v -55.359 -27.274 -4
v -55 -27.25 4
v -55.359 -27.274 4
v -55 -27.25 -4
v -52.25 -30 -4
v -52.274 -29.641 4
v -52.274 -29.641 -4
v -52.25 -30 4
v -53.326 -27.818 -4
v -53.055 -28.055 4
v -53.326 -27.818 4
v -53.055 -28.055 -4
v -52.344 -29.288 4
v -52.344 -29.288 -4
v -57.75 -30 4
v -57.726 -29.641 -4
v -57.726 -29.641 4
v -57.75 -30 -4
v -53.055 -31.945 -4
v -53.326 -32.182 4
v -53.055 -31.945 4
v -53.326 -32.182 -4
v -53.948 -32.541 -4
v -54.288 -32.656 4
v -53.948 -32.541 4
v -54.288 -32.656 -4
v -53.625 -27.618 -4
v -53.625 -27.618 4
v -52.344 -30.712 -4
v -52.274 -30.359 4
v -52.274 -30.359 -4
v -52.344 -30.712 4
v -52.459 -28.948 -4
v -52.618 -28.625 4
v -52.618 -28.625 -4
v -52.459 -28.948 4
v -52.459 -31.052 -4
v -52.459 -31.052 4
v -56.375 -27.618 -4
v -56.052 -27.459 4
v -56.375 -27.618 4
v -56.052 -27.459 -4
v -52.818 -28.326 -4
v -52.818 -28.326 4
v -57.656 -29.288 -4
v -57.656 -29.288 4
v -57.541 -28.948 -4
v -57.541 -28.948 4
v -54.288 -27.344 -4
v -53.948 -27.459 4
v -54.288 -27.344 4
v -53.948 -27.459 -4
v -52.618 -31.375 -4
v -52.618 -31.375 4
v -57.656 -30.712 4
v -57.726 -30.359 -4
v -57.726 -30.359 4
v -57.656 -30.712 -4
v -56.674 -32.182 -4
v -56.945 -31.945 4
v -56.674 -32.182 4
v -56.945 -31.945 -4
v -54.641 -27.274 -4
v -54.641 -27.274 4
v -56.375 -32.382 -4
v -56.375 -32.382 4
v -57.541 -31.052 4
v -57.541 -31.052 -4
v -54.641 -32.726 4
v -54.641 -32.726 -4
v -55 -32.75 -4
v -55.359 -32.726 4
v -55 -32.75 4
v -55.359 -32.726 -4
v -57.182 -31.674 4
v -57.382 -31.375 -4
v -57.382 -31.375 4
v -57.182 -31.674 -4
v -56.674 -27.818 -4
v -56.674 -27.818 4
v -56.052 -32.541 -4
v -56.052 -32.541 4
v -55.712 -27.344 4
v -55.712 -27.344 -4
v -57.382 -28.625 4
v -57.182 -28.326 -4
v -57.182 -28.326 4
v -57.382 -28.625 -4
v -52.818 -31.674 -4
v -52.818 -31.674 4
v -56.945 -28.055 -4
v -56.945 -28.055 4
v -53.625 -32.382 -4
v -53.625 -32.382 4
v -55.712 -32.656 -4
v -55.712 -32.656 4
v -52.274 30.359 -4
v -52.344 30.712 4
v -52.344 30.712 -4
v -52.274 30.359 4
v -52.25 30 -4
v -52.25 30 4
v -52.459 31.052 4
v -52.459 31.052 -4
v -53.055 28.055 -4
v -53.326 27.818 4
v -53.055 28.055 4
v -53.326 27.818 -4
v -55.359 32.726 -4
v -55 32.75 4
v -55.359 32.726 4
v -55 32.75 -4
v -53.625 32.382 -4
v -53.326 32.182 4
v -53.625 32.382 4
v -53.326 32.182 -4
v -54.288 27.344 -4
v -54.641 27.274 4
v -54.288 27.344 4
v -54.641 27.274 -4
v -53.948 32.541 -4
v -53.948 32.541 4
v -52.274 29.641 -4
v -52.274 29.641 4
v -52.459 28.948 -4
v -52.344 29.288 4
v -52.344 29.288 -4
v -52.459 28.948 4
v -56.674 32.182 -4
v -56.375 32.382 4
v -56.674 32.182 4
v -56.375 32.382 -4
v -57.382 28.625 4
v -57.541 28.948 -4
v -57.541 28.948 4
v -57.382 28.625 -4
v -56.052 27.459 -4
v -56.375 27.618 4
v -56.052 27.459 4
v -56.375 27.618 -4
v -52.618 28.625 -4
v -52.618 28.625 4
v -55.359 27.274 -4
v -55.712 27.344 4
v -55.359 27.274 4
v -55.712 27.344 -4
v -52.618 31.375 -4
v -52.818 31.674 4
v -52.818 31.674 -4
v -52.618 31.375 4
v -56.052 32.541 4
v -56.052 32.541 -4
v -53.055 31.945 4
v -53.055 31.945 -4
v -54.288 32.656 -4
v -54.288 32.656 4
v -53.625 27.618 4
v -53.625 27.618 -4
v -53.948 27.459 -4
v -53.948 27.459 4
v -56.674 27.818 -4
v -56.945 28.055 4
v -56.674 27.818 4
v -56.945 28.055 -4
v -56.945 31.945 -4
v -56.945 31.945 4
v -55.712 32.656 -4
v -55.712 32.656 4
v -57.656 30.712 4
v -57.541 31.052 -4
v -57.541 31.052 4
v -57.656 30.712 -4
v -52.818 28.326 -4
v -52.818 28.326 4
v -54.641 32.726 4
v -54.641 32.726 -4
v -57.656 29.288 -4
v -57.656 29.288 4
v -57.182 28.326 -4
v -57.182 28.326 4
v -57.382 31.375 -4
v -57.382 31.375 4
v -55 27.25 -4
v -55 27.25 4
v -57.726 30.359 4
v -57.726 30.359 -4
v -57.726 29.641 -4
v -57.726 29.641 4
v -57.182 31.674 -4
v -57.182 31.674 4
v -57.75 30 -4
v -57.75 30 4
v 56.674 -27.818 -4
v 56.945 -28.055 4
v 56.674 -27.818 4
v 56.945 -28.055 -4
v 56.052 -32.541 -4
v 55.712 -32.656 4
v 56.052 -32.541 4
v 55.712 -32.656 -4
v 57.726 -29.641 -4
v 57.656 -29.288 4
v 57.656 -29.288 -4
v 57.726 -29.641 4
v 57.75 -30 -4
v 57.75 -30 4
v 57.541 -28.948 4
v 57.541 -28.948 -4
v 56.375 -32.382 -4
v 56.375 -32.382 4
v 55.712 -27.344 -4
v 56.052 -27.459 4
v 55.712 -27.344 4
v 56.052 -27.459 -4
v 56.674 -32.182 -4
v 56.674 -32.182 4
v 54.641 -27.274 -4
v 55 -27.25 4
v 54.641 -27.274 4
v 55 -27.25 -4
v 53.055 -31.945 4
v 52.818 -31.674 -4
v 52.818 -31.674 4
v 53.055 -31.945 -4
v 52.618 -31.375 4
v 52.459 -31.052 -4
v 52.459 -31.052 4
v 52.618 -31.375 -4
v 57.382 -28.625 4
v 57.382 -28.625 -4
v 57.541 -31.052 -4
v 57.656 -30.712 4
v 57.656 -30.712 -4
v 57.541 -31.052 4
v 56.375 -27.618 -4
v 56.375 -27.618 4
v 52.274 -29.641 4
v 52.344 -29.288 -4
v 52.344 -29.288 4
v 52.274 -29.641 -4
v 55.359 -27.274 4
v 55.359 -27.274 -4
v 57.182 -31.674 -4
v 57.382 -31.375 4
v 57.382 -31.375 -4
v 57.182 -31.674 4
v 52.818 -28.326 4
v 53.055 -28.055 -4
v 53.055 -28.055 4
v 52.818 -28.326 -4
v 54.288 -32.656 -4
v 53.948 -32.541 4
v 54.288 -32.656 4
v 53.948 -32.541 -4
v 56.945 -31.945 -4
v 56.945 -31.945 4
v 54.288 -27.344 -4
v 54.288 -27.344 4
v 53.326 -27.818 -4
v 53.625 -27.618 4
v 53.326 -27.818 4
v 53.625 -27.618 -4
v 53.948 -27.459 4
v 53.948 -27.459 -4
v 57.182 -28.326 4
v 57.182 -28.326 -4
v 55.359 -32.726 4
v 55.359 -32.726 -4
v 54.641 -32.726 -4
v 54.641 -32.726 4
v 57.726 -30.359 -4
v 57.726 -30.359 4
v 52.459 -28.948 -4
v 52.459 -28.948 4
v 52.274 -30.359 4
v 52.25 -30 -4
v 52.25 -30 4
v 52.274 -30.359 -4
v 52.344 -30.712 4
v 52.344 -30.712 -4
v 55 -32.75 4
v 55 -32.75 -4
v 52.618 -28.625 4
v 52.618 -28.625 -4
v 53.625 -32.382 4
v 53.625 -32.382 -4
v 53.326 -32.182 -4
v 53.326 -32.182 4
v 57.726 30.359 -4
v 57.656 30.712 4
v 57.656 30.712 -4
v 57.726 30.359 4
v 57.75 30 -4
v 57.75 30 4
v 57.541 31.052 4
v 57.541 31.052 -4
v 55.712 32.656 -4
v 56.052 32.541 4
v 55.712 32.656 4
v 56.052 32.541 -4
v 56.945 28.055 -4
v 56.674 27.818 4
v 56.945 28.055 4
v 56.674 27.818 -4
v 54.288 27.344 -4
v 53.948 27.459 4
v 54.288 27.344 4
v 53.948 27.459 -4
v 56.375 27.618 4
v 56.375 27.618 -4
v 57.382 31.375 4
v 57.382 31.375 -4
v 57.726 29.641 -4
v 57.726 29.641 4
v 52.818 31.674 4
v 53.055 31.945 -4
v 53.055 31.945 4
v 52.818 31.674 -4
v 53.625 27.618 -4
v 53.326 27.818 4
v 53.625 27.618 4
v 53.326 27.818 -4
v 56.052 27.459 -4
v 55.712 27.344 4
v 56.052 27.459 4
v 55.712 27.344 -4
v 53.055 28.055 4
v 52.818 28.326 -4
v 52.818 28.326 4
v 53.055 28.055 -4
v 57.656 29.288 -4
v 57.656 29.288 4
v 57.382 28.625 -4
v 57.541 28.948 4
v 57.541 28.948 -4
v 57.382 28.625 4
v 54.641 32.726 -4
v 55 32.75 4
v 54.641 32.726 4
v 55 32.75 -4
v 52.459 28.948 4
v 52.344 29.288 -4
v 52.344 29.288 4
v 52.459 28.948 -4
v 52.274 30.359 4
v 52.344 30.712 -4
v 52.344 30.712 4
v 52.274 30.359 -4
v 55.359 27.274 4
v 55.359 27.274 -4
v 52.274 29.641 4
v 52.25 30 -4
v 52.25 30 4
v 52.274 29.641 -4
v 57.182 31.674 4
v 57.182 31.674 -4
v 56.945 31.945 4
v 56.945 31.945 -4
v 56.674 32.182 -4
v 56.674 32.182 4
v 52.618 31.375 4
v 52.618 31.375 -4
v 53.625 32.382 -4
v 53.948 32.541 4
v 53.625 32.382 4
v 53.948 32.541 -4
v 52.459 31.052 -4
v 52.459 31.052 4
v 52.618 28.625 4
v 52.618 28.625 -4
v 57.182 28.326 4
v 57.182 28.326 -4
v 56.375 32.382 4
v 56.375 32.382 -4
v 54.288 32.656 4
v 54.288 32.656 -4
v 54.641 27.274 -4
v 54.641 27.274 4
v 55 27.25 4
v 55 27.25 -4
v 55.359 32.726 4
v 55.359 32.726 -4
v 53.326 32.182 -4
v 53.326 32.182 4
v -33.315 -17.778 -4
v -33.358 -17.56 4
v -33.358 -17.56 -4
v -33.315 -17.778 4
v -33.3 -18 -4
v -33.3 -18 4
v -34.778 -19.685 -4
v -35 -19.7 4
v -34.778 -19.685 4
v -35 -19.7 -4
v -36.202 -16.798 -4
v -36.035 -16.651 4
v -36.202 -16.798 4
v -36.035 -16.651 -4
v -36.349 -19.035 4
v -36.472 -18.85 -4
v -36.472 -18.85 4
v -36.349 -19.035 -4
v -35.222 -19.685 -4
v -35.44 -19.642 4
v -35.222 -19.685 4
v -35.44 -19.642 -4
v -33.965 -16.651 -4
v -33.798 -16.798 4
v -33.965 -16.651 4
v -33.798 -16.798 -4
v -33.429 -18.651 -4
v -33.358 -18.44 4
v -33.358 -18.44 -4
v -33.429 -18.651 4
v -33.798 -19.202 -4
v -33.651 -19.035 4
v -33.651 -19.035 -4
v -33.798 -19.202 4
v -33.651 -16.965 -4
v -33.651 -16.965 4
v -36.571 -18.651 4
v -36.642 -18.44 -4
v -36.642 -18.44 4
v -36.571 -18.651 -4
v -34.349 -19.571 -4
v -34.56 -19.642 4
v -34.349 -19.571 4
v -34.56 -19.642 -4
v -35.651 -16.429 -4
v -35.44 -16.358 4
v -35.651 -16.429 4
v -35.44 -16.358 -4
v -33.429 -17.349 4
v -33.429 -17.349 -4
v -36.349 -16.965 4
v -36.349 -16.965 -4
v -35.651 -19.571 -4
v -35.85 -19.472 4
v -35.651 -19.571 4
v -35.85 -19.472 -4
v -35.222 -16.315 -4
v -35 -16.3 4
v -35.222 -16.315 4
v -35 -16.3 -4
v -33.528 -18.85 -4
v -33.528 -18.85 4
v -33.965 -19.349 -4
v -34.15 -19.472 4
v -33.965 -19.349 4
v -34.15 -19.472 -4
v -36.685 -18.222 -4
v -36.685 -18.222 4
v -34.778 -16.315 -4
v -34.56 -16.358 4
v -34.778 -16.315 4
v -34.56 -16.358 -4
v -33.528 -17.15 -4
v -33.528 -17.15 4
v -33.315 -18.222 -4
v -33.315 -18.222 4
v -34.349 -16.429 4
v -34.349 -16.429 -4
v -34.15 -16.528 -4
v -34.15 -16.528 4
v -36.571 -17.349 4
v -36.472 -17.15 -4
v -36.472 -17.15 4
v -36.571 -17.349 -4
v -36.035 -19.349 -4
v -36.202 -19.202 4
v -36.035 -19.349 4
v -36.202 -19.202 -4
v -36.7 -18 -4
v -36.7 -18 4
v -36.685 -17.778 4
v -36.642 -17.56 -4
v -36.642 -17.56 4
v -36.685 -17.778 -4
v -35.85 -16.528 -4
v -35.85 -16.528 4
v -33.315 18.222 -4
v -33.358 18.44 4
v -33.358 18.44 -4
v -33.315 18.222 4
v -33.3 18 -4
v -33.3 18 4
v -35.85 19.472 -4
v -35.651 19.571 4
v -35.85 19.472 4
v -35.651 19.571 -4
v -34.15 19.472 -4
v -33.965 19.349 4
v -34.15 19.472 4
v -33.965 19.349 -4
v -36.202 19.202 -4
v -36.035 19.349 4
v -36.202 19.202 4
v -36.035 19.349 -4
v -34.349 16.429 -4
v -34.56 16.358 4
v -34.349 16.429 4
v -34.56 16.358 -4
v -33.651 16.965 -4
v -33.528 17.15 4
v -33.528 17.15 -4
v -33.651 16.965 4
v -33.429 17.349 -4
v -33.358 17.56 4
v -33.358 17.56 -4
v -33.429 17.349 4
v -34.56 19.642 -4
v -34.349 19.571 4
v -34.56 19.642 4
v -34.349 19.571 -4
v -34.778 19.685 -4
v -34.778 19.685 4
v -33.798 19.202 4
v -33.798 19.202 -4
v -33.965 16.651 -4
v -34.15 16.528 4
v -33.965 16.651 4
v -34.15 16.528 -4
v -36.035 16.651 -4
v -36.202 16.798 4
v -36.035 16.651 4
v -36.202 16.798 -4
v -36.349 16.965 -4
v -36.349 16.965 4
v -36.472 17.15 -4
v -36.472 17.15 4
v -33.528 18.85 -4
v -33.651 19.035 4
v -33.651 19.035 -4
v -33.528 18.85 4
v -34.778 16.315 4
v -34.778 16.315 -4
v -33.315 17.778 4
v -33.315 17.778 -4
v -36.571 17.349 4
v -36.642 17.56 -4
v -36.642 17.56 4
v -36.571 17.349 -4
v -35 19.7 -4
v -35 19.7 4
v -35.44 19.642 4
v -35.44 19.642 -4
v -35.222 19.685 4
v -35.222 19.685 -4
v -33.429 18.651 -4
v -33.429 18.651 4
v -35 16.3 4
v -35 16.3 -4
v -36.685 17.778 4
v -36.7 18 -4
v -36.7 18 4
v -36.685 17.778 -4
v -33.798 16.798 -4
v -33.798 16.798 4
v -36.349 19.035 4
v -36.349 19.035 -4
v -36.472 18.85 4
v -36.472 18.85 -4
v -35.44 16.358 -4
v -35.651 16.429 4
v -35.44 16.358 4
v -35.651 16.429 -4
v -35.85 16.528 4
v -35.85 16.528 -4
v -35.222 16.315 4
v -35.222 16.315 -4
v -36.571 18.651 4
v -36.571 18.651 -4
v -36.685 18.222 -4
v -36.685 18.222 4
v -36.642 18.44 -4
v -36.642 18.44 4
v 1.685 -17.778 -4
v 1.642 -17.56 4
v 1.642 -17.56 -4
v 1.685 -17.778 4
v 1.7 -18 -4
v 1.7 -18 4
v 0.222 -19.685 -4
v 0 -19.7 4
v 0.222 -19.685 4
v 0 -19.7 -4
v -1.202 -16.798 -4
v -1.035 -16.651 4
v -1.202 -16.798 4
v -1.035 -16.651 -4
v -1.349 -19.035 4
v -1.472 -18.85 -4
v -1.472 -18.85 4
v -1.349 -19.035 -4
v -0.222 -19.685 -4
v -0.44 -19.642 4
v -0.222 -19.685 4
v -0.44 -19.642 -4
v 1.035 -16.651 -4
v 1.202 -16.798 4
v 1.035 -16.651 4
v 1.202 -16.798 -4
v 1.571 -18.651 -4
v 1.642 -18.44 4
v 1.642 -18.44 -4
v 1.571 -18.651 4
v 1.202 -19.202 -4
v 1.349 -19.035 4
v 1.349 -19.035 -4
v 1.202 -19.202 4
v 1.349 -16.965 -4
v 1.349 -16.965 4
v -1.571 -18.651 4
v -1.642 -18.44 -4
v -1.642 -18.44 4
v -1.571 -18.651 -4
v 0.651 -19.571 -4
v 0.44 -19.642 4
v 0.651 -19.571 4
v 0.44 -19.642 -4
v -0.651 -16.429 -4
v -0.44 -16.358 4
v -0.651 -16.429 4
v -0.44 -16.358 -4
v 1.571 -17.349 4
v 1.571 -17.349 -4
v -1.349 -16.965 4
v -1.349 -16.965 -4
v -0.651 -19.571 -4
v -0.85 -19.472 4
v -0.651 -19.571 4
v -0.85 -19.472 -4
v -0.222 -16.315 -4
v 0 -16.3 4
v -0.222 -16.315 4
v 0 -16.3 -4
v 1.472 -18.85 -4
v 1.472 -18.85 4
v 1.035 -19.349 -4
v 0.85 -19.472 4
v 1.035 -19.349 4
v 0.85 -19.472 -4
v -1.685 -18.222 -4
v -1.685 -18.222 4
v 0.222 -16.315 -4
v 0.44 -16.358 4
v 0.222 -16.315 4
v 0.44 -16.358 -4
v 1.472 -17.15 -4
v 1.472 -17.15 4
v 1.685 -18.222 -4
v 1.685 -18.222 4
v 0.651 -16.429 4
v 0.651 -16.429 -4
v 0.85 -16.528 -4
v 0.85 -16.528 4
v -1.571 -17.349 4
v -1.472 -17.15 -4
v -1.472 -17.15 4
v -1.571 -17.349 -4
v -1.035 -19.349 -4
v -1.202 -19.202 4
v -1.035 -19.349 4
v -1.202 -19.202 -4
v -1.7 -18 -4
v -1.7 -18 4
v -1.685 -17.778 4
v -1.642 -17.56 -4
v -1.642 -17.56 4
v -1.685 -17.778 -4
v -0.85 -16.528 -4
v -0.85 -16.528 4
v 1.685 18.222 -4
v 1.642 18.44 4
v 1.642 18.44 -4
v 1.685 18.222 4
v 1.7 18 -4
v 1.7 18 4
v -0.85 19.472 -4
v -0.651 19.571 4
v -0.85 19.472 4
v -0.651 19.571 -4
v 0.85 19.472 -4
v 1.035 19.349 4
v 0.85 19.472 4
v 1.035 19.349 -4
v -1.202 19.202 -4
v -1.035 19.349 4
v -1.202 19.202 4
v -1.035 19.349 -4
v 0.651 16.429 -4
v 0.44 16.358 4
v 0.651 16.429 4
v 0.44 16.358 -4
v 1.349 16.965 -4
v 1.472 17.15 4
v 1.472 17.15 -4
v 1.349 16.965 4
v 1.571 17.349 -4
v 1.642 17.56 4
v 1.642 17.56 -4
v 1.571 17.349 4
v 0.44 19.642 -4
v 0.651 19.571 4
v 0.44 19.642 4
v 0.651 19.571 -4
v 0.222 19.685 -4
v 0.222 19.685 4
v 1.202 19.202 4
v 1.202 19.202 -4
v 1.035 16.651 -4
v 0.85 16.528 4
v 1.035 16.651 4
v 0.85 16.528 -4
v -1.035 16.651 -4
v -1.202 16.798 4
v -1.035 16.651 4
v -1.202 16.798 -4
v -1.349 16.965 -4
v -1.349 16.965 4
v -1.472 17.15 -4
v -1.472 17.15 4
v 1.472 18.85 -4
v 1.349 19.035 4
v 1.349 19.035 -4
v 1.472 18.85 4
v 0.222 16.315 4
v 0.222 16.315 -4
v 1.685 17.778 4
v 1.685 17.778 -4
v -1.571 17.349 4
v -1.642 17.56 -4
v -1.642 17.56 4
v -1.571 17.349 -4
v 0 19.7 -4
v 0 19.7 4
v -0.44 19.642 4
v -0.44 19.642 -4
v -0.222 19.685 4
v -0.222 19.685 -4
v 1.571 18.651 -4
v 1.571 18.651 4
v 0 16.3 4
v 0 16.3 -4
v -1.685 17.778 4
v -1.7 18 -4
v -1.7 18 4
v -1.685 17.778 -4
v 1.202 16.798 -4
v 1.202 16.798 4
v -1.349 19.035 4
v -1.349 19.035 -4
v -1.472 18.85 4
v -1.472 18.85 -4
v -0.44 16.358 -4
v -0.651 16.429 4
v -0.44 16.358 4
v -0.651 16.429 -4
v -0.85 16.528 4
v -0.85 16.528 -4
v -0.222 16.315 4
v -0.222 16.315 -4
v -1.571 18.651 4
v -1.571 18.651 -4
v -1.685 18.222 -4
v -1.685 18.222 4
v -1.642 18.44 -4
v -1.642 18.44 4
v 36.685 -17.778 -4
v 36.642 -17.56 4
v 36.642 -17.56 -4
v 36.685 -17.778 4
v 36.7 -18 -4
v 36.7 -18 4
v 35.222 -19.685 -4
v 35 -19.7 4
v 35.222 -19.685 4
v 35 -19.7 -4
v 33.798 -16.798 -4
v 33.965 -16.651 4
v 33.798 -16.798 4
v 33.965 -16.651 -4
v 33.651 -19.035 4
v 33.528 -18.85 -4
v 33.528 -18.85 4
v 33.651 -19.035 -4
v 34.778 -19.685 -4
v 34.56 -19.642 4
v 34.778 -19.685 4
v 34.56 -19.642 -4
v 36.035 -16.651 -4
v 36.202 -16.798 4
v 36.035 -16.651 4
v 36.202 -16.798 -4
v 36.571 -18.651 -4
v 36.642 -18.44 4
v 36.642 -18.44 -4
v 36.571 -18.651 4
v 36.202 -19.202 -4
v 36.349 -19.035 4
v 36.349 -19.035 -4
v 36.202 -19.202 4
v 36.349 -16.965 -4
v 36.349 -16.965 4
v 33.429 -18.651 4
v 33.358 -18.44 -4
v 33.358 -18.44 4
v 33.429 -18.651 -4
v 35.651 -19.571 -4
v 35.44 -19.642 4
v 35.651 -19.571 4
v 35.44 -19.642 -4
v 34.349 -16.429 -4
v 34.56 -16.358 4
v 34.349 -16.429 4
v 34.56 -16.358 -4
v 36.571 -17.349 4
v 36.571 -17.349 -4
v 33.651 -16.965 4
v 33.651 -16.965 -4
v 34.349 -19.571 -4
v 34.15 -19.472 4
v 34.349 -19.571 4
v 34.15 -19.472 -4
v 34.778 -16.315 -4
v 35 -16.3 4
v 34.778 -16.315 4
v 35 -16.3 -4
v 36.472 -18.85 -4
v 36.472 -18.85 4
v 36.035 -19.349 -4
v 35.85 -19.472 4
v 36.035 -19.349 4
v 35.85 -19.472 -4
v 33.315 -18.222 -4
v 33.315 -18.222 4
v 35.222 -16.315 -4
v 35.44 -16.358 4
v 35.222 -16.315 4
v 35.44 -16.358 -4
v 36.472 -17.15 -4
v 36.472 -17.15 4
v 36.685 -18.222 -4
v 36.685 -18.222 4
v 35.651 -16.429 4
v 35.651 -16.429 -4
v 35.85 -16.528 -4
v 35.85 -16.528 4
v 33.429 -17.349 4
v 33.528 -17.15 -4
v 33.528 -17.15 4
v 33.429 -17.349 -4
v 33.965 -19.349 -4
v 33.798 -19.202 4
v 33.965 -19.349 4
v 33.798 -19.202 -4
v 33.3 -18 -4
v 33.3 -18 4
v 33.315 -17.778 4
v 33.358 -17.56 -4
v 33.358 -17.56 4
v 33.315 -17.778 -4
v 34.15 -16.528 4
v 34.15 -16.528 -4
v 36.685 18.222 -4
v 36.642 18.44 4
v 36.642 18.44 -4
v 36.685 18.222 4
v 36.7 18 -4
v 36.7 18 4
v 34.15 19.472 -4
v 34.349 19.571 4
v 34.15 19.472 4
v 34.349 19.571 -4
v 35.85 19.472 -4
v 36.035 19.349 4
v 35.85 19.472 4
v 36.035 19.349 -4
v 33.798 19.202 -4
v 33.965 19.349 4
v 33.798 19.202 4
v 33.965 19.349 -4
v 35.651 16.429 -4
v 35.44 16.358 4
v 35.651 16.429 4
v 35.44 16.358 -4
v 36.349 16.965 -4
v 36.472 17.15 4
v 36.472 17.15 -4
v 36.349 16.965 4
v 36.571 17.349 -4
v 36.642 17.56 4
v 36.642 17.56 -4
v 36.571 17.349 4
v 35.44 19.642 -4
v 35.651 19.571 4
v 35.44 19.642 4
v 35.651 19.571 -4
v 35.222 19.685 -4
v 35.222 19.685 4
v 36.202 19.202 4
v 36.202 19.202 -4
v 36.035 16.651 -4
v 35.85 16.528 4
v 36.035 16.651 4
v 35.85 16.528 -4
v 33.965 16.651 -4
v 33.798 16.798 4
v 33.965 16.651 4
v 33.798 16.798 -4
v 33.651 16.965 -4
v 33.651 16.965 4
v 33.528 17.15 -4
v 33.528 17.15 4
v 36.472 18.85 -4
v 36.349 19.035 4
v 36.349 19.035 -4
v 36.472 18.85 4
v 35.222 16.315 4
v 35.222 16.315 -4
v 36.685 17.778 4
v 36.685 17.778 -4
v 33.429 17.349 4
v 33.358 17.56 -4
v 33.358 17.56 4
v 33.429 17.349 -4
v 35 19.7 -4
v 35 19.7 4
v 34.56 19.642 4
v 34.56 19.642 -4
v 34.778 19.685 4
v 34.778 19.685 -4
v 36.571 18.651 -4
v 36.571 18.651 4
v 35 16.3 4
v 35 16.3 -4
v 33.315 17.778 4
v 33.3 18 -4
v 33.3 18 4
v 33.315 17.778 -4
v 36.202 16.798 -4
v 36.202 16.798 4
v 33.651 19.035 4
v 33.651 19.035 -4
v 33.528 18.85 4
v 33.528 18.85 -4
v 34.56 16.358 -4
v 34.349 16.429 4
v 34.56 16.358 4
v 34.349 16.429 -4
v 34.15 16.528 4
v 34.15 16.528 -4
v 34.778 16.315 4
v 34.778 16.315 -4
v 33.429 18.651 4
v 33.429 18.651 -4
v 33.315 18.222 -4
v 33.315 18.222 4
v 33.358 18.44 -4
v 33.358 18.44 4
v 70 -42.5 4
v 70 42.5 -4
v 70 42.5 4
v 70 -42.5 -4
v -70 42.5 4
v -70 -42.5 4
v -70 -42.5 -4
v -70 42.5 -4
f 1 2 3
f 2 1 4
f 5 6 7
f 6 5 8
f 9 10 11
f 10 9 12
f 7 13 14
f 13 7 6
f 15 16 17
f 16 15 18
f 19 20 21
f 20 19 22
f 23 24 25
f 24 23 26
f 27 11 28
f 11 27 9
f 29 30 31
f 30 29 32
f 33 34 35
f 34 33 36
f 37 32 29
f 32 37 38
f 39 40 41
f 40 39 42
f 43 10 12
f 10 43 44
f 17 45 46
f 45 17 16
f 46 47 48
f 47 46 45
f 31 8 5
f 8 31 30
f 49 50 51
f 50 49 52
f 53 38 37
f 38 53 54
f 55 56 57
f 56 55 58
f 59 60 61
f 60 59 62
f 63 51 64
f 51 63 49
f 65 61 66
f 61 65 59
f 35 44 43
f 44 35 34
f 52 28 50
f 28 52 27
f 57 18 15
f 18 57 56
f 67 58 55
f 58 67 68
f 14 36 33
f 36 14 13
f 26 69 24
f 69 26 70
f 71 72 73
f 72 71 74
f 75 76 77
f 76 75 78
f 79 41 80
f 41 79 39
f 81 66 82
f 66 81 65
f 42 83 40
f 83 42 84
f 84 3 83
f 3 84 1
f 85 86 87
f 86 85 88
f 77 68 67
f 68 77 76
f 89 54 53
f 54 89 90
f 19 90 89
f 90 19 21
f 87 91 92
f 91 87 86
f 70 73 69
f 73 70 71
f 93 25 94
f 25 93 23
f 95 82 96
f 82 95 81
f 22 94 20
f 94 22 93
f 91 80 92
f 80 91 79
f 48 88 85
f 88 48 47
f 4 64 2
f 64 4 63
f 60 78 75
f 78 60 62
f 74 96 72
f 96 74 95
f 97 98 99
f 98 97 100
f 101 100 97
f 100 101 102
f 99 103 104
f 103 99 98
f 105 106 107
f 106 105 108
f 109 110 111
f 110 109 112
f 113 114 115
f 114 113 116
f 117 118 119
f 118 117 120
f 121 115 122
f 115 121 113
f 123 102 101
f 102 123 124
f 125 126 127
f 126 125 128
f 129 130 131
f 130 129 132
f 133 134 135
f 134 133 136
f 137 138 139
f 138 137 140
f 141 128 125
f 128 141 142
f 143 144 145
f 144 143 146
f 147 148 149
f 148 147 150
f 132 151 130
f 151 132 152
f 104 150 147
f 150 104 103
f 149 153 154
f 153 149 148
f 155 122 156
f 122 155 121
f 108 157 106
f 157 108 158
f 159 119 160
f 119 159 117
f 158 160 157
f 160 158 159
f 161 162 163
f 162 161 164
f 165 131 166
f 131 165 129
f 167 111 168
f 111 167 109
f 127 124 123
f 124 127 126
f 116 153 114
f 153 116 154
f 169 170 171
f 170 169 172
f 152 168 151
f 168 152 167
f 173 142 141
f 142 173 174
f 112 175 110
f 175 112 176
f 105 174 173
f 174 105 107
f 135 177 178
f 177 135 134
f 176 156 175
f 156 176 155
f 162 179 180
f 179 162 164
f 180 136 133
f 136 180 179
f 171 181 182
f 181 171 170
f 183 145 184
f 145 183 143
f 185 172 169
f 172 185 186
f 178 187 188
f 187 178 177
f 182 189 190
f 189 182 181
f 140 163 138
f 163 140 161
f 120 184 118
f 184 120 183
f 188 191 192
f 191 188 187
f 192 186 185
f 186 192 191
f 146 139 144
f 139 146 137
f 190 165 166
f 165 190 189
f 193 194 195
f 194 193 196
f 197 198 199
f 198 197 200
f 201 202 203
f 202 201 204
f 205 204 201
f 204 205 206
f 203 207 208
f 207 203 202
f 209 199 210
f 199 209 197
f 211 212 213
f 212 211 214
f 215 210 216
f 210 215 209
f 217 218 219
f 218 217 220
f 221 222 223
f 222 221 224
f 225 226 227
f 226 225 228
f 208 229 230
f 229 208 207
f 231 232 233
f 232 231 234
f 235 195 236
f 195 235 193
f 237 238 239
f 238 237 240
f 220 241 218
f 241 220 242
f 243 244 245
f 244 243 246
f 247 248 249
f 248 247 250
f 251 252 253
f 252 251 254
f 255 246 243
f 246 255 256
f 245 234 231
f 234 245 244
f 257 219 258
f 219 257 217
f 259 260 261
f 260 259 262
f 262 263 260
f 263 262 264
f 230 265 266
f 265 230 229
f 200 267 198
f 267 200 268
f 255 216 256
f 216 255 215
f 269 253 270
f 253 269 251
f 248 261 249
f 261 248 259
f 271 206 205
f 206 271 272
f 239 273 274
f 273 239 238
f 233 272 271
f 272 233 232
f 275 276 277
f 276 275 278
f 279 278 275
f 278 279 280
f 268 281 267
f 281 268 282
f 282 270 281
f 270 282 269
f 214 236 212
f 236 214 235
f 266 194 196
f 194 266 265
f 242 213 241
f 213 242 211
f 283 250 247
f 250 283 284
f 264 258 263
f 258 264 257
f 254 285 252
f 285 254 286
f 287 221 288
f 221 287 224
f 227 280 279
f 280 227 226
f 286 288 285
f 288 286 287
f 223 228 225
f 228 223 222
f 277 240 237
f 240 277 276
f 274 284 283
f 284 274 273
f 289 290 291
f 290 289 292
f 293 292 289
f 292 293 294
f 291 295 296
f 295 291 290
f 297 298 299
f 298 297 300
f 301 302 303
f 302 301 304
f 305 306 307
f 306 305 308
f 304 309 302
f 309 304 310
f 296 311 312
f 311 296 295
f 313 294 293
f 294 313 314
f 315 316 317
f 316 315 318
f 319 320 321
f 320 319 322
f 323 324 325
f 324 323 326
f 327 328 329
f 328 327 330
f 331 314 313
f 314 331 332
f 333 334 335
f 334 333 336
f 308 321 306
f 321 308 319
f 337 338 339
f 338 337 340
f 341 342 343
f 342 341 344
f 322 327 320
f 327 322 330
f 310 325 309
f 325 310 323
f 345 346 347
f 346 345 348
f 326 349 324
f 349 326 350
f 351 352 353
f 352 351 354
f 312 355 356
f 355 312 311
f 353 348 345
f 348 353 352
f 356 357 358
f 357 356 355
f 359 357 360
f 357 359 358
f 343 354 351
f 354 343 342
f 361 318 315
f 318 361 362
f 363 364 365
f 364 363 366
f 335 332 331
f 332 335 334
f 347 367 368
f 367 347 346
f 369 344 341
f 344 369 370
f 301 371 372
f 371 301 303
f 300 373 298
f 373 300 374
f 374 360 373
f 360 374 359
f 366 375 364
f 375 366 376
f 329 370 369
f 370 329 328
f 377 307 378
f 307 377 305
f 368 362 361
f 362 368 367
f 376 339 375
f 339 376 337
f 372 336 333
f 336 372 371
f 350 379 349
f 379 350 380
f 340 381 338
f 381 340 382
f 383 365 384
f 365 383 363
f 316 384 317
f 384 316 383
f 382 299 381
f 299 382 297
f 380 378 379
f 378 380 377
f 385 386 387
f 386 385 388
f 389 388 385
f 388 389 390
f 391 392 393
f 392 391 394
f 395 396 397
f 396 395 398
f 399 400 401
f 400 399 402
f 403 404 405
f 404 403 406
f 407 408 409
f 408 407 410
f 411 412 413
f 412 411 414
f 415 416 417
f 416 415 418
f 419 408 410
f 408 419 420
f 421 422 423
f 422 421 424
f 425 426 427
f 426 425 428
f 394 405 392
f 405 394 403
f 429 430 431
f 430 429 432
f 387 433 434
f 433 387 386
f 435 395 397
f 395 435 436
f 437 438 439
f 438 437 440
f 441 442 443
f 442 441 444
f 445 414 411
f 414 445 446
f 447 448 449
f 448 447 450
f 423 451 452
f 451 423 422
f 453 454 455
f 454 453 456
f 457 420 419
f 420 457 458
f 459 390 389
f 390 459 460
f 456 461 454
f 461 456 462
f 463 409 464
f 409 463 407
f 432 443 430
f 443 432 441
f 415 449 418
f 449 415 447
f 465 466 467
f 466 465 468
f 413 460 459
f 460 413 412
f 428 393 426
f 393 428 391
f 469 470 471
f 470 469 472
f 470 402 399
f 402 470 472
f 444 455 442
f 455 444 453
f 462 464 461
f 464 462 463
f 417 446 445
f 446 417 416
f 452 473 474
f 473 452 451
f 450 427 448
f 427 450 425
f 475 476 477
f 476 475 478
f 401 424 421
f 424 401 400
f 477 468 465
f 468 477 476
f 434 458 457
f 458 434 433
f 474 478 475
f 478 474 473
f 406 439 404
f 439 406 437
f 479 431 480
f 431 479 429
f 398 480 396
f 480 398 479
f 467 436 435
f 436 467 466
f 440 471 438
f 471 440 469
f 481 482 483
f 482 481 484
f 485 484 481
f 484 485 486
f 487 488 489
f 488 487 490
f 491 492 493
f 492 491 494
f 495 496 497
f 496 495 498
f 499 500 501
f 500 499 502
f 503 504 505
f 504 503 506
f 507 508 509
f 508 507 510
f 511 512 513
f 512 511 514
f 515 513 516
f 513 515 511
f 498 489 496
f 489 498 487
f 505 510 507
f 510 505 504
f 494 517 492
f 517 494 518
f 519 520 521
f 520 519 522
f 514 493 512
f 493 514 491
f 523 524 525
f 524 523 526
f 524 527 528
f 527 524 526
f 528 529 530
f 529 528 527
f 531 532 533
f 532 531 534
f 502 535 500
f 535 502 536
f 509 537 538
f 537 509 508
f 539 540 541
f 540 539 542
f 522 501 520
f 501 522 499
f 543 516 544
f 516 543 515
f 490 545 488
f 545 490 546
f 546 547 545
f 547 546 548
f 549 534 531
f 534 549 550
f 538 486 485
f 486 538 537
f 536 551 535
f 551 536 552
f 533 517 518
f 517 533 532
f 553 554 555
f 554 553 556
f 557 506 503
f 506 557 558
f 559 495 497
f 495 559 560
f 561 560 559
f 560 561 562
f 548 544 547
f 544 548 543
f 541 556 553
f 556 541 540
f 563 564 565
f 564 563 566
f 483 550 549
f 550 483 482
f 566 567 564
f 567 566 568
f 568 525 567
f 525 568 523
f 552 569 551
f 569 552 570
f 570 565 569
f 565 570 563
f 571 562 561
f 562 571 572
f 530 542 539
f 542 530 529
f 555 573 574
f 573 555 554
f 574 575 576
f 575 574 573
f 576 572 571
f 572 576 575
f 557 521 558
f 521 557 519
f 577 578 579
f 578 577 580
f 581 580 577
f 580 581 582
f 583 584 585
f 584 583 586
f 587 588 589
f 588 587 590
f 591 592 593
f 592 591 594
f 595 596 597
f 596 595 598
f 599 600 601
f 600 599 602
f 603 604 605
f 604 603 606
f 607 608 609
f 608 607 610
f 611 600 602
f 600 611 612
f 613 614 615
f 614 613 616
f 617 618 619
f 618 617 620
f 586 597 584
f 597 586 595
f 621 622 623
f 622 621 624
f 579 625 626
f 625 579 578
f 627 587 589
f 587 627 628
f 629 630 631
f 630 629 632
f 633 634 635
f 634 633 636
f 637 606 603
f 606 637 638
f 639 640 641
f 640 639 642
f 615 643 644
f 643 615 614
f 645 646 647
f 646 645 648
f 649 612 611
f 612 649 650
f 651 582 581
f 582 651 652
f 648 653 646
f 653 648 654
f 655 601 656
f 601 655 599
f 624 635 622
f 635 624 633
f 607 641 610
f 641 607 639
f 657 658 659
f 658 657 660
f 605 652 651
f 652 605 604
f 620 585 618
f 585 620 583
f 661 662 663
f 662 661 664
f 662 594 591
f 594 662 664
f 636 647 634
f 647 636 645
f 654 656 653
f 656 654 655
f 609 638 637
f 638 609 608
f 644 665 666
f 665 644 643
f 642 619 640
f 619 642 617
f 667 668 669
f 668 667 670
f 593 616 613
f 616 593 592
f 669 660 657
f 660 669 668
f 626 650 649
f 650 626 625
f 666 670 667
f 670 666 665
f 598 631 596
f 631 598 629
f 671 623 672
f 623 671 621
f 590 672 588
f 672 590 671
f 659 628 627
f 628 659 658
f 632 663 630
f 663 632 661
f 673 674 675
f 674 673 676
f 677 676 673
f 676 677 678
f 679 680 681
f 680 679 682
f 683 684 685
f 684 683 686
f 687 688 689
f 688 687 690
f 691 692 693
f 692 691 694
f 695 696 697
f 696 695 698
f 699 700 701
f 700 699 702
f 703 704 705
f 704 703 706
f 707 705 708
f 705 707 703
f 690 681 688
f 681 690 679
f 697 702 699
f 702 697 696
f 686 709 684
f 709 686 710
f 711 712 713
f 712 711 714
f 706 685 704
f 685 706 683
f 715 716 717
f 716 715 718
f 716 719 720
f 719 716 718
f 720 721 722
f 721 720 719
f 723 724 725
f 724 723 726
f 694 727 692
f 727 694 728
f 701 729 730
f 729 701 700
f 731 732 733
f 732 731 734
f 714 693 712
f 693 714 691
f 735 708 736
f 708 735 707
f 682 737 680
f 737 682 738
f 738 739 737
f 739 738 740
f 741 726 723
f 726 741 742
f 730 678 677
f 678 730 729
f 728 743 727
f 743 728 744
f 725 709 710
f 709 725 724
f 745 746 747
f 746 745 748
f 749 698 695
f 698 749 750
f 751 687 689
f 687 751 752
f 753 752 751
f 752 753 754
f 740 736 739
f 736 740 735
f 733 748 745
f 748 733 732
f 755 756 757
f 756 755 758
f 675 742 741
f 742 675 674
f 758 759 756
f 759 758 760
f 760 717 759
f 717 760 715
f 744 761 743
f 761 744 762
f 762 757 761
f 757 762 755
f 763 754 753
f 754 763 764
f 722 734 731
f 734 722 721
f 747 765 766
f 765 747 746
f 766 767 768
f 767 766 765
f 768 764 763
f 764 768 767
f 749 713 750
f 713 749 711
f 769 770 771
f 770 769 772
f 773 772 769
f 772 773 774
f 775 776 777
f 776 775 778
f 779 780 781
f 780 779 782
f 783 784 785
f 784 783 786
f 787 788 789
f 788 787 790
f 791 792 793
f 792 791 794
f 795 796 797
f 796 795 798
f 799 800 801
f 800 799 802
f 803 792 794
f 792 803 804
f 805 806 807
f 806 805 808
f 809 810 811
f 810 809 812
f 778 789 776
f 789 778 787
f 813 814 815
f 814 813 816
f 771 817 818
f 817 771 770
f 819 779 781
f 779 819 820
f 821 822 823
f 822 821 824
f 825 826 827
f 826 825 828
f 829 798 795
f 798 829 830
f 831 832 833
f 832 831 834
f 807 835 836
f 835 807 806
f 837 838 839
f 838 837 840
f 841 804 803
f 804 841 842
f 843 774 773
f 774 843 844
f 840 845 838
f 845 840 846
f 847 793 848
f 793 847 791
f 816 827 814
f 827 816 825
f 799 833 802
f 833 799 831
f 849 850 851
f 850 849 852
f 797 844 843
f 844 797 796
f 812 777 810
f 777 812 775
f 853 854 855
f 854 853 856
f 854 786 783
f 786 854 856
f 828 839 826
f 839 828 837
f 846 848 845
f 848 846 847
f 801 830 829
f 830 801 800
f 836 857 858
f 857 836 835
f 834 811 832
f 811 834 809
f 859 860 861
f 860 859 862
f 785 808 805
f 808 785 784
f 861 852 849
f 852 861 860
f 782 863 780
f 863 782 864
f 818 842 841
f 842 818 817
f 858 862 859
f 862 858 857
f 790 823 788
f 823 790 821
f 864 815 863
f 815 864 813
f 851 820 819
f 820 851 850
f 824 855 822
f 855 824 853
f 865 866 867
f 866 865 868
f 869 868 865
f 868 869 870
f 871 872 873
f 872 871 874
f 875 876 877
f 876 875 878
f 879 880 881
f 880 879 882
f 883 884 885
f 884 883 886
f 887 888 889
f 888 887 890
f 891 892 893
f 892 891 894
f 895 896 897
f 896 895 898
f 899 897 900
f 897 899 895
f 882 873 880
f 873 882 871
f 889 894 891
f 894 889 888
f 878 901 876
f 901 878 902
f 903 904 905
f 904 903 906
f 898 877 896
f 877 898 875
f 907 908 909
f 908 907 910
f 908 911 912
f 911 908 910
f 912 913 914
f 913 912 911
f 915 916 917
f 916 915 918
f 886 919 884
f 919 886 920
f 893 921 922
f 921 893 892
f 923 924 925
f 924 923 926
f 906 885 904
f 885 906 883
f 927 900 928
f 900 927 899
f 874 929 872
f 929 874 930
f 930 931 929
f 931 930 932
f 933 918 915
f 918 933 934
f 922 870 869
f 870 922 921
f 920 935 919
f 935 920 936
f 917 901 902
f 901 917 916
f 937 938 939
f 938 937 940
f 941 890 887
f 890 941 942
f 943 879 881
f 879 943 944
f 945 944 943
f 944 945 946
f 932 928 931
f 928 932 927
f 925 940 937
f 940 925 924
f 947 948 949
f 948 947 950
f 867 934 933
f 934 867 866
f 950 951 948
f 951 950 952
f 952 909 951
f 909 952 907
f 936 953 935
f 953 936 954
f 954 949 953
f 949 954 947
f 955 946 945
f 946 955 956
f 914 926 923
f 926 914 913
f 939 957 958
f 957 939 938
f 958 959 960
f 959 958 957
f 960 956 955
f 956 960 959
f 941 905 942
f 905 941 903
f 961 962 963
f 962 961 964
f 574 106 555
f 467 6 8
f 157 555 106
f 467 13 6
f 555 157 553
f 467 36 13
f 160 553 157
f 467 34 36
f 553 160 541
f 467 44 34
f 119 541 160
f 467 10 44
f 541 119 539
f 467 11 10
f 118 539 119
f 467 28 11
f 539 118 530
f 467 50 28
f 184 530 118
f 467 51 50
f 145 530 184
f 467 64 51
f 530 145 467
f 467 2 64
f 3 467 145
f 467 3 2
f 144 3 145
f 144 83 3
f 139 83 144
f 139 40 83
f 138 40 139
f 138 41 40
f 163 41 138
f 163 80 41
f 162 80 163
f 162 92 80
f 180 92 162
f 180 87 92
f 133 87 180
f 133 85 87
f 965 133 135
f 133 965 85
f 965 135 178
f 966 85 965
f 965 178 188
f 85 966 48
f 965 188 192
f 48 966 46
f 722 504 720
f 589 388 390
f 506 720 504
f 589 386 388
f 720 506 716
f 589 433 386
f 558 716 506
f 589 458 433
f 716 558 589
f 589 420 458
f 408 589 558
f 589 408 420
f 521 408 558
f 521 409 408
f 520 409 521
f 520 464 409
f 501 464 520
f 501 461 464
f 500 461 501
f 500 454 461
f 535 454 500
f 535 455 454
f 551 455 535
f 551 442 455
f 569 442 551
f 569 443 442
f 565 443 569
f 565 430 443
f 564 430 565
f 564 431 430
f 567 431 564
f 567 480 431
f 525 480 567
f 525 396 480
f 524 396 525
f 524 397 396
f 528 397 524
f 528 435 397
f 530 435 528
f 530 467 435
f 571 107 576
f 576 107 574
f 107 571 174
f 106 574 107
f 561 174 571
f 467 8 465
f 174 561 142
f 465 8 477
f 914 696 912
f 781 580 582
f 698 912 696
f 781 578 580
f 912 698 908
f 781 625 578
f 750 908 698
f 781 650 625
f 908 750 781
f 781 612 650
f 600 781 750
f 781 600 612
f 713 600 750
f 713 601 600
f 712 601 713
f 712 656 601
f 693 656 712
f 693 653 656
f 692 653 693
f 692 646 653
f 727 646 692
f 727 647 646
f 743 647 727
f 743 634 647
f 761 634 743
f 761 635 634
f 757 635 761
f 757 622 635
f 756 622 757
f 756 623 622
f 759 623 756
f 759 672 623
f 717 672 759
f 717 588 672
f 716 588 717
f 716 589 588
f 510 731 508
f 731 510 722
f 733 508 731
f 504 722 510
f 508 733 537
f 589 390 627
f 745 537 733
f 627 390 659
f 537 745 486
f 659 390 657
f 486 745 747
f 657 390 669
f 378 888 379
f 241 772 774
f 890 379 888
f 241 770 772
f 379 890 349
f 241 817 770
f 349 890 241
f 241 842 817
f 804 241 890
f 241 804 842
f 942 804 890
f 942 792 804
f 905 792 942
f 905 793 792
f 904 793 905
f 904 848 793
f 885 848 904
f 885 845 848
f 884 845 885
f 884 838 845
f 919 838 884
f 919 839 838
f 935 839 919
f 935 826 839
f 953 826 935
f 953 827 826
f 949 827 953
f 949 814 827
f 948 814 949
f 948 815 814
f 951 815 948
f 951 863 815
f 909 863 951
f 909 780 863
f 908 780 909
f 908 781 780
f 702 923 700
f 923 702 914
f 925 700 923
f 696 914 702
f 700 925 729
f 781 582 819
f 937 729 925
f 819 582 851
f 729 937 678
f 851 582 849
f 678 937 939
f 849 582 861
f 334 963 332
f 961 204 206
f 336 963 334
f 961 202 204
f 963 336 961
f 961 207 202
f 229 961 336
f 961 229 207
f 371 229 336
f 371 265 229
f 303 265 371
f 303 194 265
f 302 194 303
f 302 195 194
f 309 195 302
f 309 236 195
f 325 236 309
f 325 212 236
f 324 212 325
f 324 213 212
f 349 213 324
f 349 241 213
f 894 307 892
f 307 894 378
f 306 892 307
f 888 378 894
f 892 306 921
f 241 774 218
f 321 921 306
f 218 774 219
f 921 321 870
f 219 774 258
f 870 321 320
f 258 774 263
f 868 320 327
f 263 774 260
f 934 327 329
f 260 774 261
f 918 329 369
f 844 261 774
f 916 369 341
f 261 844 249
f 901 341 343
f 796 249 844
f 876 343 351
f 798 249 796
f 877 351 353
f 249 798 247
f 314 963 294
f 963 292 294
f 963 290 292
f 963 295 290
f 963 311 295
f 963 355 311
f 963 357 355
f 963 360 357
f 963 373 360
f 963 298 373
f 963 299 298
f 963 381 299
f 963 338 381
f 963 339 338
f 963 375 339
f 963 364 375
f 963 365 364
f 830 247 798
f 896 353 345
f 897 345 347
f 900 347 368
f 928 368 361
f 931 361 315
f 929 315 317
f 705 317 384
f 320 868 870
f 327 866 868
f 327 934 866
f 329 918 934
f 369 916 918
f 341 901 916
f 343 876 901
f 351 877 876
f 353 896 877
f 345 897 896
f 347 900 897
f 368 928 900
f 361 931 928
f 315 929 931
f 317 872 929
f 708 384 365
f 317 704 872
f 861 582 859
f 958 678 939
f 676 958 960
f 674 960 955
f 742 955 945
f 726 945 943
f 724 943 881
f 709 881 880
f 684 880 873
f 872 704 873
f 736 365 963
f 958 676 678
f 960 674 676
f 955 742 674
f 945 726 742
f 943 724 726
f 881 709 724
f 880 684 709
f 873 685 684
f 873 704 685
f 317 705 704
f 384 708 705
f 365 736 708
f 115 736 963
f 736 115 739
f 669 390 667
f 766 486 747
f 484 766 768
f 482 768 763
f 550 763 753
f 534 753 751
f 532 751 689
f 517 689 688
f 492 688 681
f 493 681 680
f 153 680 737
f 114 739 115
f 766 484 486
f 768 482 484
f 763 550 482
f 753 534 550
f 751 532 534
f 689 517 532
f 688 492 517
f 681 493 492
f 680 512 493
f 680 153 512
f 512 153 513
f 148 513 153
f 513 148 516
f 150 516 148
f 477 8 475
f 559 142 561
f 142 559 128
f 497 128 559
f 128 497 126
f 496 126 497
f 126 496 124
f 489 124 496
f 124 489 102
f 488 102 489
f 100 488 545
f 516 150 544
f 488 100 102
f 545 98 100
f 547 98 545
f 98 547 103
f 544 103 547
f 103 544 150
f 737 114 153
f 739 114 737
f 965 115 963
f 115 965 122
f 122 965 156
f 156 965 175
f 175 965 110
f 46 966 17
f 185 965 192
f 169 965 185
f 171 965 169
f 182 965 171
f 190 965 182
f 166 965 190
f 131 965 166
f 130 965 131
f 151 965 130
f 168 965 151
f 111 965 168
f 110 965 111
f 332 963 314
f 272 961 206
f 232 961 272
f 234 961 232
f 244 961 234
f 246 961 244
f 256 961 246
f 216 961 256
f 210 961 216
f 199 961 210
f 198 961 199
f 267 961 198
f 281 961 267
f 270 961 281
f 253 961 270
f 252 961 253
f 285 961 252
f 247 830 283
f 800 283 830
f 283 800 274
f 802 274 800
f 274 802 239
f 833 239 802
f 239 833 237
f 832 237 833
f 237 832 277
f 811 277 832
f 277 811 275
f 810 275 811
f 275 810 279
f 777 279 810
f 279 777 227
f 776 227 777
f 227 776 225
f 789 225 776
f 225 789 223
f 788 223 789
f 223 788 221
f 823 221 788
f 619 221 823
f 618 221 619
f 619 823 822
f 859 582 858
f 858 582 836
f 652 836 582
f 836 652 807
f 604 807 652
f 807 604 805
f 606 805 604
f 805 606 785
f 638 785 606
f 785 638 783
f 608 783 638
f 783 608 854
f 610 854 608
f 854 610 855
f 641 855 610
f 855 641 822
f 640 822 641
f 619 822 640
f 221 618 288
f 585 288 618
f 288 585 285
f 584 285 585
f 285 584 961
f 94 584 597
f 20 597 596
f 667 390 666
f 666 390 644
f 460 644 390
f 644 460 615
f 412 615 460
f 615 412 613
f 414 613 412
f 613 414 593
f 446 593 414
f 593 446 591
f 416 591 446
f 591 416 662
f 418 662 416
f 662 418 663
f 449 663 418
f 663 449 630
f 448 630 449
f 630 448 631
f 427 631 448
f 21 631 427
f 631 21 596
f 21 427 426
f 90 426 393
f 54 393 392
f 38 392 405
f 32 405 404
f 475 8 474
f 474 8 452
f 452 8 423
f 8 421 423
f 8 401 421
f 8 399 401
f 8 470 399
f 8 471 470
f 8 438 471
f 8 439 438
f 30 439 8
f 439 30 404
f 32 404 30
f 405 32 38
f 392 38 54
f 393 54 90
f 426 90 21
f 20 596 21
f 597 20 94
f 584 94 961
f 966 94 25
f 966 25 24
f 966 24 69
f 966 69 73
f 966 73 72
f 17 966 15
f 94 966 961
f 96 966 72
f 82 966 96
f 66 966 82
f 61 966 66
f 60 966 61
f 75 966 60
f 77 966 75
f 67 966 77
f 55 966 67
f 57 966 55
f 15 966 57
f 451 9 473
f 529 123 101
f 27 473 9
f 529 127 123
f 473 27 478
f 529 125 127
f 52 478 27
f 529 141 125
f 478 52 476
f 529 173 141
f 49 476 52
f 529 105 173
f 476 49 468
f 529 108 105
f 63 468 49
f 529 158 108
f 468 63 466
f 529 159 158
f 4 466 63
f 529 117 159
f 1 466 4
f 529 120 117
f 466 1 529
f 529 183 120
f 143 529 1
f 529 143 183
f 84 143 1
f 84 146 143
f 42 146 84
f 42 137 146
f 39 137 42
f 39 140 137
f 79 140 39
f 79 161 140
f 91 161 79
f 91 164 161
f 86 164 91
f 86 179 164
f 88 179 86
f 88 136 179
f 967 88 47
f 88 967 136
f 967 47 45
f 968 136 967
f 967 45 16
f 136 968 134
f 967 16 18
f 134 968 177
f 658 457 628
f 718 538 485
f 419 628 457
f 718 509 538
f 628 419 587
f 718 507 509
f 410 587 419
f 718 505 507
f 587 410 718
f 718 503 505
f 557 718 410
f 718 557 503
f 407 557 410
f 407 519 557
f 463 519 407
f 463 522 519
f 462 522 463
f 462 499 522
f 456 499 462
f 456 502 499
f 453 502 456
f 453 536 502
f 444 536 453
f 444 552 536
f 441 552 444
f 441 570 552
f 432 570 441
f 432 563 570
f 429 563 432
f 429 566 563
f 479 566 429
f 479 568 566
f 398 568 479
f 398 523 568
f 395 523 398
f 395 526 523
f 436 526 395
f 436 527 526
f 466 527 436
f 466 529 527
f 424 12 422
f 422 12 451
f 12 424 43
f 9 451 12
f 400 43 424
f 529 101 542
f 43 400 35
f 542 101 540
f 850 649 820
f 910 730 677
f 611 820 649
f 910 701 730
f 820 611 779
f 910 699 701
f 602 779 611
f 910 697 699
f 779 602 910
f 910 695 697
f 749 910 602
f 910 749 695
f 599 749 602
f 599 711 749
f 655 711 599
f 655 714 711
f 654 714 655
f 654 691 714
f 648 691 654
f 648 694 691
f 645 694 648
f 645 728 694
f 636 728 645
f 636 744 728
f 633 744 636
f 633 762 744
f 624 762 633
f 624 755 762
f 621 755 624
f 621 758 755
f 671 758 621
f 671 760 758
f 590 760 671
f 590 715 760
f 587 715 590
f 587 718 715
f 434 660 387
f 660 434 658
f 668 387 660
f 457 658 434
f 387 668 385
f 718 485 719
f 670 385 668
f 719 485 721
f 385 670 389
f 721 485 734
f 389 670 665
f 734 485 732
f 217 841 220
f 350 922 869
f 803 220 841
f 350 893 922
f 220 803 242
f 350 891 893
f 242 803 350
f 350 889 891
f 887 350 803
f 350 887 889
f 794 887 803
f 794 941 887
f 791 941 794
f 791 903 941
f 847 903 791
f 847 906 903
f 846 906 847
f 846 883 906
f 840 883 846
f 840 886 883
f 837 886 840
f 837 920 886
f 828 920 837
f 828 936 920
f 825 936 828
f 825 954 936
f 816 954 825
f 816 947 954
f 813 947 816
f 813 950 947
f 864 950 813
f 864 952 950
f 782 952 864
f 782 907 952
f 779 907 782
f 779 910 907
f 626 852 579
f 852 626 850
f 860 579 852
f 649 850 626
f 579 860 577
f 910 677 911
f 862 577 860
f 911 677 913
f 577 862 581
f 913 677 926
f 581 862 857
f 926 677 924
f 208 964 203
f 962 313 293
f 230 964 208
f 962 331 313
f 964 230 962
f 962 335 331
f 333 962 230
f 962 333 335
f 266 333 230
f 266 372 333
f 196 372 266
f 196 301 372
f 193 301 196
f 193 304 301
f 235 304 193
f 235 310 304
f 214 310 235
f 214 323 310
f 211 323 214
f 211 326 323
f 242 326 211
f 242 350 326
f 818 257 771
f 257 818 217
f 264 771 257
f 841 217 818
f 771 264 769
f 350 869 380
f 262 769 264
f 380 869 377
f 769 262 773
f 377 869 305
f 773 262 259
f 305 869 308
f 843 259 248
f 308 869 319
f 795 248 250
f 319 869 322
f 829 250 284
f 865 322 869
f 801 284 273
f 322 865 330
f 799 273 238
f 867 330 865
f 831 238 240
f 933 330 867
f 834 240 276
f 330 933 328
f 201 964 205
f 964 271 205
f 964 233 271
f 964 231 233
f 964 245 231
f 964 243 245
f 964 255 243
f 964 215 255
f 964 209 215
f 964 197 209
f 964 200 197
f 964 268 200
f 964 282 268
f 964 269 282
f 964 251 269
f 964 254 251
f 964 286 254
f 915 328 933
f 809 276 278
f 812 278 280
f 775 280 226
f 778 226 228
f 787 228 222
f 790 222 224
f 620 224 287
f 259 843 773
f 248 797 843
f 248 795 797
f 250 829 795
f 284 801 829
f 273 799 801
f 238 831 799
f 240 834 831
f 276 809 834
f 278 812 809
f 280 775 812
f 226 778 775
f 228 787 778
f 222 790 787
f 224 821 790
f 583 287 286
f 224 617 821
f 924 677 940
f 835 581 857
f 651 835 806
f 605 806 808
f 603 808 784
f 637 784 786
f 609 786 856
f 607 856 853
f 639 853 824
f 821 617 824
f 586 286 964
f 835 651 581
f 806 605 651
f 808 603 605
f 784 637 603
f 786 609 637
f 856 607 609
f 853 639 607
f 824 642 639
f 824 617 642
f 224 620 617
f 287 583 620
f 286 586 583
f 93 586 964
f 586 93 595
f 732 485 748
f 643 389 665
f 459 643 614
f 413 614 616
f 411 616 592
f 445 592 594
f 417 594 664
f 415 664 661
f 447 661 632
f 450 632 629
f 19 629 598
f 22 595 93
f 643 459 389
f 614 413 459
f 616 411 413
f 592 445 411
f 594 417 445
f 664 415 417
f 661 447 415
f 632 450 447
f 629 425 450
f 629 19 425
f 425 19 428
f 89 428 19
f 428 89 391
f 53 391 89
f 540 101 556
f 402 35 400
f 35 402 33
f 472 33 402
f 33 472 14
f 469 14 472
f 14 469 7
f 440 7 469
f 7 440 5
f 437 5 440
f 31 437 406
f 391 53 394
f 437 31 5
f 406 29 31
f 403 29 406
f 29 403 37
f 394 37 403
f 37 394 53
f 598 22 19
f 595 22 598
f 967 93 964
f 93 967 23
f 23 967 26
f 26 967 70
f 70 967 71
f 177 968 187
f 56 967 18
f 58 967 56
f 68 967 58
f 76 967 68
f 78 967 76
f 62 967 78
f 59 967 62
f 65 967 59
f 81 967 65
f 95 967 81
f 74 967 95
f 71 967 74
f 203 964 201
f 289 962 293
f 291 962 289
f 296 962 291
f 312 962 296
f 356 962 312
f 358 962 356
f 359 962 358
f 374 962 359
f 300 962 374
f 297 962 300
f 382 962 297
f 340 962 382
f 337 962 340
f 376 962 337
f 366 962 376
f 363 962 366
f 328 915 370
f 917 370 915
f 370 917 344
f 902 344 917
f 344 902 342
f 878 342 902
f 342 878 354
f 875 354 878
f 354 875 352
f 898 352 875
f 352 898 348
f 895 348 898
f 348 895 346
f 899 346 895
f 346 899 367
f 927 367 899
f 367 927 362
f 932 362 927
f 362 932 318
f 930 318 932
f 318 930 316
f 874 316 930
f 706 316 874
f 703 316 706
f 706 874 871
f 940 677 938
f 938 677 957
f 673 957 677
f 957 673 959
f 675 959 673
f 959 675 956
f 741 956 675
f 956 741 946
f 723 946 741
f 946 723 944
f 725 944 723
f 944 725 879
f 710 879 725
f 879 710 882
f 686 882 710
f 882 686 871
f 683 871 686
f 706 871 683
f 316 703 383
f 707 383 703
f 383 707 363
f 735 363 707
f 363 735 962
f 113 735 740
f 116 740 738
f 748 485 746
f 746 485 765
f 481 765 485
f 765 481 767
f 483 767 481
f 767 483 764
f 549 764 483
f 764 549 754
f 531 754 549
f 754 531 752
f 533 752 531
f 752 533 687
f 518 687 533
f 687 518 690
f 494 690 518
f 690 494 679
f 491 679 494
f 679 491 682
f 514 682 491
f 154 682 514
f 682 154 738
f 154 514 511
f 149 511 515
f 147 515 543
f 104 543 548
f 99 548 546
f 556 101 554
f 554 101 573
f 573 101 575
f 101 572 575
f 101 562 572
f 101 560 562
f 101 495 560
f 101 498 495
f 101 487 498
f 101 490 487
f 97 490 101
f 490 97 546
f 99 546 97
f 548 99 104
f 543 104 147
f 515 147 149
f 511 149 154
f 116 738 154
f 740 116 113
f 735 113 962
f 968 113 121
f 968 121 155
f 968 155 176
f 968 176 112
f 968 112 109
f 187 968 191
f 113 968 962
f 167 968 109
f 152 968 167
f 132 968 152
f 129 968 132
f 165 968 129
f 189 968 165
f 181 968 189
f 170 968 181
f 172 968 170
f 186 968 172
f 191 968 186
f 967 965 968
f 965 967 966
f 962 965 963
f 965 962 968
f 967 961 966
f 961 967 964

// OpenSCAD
// HIL04 draft passive desktop fixture. No motors, no powered brake.
// Component envelopes only; verify actual bearings, rollers, load cell,
// manual release, guards and retention before fabrication.
part="base"; // [base,guide,guard_coupon]
$fn=48;
module base(){
 difference(){
  cube([140,85,8],center=true);
  for(x=[-55,55],y=[-30,30])translate([x,y,-6])cylinder(d=5.5,h=12);
  for(x=[-35,0,35],y=[-18,18])translate([x,y,-6])cylinder(d=3.4,h=12);
 }
}
module guide(){
 difference(){
  union(){cube([24,32,5],center=true);translate([0,0,10])cube([24,12,20],center=true);}
  translate([0,0,14])rotate([0,90,0])cylinder(d=8,h=30,center=true);
  for(y=[-11,11])translate([0,y,-4])cylinder(d=3.4,h=10);
 }
}
module guard_coupon(){
 difference(){cube([40,26,4],center=true);for(x=[-14,14])translate([x,0,-3])cylinder(d=3.4,h=6);}
}
if(part=="base")base();else if(part=="guide")guide();else if(part=="guard_coupon")guard_coupon();
